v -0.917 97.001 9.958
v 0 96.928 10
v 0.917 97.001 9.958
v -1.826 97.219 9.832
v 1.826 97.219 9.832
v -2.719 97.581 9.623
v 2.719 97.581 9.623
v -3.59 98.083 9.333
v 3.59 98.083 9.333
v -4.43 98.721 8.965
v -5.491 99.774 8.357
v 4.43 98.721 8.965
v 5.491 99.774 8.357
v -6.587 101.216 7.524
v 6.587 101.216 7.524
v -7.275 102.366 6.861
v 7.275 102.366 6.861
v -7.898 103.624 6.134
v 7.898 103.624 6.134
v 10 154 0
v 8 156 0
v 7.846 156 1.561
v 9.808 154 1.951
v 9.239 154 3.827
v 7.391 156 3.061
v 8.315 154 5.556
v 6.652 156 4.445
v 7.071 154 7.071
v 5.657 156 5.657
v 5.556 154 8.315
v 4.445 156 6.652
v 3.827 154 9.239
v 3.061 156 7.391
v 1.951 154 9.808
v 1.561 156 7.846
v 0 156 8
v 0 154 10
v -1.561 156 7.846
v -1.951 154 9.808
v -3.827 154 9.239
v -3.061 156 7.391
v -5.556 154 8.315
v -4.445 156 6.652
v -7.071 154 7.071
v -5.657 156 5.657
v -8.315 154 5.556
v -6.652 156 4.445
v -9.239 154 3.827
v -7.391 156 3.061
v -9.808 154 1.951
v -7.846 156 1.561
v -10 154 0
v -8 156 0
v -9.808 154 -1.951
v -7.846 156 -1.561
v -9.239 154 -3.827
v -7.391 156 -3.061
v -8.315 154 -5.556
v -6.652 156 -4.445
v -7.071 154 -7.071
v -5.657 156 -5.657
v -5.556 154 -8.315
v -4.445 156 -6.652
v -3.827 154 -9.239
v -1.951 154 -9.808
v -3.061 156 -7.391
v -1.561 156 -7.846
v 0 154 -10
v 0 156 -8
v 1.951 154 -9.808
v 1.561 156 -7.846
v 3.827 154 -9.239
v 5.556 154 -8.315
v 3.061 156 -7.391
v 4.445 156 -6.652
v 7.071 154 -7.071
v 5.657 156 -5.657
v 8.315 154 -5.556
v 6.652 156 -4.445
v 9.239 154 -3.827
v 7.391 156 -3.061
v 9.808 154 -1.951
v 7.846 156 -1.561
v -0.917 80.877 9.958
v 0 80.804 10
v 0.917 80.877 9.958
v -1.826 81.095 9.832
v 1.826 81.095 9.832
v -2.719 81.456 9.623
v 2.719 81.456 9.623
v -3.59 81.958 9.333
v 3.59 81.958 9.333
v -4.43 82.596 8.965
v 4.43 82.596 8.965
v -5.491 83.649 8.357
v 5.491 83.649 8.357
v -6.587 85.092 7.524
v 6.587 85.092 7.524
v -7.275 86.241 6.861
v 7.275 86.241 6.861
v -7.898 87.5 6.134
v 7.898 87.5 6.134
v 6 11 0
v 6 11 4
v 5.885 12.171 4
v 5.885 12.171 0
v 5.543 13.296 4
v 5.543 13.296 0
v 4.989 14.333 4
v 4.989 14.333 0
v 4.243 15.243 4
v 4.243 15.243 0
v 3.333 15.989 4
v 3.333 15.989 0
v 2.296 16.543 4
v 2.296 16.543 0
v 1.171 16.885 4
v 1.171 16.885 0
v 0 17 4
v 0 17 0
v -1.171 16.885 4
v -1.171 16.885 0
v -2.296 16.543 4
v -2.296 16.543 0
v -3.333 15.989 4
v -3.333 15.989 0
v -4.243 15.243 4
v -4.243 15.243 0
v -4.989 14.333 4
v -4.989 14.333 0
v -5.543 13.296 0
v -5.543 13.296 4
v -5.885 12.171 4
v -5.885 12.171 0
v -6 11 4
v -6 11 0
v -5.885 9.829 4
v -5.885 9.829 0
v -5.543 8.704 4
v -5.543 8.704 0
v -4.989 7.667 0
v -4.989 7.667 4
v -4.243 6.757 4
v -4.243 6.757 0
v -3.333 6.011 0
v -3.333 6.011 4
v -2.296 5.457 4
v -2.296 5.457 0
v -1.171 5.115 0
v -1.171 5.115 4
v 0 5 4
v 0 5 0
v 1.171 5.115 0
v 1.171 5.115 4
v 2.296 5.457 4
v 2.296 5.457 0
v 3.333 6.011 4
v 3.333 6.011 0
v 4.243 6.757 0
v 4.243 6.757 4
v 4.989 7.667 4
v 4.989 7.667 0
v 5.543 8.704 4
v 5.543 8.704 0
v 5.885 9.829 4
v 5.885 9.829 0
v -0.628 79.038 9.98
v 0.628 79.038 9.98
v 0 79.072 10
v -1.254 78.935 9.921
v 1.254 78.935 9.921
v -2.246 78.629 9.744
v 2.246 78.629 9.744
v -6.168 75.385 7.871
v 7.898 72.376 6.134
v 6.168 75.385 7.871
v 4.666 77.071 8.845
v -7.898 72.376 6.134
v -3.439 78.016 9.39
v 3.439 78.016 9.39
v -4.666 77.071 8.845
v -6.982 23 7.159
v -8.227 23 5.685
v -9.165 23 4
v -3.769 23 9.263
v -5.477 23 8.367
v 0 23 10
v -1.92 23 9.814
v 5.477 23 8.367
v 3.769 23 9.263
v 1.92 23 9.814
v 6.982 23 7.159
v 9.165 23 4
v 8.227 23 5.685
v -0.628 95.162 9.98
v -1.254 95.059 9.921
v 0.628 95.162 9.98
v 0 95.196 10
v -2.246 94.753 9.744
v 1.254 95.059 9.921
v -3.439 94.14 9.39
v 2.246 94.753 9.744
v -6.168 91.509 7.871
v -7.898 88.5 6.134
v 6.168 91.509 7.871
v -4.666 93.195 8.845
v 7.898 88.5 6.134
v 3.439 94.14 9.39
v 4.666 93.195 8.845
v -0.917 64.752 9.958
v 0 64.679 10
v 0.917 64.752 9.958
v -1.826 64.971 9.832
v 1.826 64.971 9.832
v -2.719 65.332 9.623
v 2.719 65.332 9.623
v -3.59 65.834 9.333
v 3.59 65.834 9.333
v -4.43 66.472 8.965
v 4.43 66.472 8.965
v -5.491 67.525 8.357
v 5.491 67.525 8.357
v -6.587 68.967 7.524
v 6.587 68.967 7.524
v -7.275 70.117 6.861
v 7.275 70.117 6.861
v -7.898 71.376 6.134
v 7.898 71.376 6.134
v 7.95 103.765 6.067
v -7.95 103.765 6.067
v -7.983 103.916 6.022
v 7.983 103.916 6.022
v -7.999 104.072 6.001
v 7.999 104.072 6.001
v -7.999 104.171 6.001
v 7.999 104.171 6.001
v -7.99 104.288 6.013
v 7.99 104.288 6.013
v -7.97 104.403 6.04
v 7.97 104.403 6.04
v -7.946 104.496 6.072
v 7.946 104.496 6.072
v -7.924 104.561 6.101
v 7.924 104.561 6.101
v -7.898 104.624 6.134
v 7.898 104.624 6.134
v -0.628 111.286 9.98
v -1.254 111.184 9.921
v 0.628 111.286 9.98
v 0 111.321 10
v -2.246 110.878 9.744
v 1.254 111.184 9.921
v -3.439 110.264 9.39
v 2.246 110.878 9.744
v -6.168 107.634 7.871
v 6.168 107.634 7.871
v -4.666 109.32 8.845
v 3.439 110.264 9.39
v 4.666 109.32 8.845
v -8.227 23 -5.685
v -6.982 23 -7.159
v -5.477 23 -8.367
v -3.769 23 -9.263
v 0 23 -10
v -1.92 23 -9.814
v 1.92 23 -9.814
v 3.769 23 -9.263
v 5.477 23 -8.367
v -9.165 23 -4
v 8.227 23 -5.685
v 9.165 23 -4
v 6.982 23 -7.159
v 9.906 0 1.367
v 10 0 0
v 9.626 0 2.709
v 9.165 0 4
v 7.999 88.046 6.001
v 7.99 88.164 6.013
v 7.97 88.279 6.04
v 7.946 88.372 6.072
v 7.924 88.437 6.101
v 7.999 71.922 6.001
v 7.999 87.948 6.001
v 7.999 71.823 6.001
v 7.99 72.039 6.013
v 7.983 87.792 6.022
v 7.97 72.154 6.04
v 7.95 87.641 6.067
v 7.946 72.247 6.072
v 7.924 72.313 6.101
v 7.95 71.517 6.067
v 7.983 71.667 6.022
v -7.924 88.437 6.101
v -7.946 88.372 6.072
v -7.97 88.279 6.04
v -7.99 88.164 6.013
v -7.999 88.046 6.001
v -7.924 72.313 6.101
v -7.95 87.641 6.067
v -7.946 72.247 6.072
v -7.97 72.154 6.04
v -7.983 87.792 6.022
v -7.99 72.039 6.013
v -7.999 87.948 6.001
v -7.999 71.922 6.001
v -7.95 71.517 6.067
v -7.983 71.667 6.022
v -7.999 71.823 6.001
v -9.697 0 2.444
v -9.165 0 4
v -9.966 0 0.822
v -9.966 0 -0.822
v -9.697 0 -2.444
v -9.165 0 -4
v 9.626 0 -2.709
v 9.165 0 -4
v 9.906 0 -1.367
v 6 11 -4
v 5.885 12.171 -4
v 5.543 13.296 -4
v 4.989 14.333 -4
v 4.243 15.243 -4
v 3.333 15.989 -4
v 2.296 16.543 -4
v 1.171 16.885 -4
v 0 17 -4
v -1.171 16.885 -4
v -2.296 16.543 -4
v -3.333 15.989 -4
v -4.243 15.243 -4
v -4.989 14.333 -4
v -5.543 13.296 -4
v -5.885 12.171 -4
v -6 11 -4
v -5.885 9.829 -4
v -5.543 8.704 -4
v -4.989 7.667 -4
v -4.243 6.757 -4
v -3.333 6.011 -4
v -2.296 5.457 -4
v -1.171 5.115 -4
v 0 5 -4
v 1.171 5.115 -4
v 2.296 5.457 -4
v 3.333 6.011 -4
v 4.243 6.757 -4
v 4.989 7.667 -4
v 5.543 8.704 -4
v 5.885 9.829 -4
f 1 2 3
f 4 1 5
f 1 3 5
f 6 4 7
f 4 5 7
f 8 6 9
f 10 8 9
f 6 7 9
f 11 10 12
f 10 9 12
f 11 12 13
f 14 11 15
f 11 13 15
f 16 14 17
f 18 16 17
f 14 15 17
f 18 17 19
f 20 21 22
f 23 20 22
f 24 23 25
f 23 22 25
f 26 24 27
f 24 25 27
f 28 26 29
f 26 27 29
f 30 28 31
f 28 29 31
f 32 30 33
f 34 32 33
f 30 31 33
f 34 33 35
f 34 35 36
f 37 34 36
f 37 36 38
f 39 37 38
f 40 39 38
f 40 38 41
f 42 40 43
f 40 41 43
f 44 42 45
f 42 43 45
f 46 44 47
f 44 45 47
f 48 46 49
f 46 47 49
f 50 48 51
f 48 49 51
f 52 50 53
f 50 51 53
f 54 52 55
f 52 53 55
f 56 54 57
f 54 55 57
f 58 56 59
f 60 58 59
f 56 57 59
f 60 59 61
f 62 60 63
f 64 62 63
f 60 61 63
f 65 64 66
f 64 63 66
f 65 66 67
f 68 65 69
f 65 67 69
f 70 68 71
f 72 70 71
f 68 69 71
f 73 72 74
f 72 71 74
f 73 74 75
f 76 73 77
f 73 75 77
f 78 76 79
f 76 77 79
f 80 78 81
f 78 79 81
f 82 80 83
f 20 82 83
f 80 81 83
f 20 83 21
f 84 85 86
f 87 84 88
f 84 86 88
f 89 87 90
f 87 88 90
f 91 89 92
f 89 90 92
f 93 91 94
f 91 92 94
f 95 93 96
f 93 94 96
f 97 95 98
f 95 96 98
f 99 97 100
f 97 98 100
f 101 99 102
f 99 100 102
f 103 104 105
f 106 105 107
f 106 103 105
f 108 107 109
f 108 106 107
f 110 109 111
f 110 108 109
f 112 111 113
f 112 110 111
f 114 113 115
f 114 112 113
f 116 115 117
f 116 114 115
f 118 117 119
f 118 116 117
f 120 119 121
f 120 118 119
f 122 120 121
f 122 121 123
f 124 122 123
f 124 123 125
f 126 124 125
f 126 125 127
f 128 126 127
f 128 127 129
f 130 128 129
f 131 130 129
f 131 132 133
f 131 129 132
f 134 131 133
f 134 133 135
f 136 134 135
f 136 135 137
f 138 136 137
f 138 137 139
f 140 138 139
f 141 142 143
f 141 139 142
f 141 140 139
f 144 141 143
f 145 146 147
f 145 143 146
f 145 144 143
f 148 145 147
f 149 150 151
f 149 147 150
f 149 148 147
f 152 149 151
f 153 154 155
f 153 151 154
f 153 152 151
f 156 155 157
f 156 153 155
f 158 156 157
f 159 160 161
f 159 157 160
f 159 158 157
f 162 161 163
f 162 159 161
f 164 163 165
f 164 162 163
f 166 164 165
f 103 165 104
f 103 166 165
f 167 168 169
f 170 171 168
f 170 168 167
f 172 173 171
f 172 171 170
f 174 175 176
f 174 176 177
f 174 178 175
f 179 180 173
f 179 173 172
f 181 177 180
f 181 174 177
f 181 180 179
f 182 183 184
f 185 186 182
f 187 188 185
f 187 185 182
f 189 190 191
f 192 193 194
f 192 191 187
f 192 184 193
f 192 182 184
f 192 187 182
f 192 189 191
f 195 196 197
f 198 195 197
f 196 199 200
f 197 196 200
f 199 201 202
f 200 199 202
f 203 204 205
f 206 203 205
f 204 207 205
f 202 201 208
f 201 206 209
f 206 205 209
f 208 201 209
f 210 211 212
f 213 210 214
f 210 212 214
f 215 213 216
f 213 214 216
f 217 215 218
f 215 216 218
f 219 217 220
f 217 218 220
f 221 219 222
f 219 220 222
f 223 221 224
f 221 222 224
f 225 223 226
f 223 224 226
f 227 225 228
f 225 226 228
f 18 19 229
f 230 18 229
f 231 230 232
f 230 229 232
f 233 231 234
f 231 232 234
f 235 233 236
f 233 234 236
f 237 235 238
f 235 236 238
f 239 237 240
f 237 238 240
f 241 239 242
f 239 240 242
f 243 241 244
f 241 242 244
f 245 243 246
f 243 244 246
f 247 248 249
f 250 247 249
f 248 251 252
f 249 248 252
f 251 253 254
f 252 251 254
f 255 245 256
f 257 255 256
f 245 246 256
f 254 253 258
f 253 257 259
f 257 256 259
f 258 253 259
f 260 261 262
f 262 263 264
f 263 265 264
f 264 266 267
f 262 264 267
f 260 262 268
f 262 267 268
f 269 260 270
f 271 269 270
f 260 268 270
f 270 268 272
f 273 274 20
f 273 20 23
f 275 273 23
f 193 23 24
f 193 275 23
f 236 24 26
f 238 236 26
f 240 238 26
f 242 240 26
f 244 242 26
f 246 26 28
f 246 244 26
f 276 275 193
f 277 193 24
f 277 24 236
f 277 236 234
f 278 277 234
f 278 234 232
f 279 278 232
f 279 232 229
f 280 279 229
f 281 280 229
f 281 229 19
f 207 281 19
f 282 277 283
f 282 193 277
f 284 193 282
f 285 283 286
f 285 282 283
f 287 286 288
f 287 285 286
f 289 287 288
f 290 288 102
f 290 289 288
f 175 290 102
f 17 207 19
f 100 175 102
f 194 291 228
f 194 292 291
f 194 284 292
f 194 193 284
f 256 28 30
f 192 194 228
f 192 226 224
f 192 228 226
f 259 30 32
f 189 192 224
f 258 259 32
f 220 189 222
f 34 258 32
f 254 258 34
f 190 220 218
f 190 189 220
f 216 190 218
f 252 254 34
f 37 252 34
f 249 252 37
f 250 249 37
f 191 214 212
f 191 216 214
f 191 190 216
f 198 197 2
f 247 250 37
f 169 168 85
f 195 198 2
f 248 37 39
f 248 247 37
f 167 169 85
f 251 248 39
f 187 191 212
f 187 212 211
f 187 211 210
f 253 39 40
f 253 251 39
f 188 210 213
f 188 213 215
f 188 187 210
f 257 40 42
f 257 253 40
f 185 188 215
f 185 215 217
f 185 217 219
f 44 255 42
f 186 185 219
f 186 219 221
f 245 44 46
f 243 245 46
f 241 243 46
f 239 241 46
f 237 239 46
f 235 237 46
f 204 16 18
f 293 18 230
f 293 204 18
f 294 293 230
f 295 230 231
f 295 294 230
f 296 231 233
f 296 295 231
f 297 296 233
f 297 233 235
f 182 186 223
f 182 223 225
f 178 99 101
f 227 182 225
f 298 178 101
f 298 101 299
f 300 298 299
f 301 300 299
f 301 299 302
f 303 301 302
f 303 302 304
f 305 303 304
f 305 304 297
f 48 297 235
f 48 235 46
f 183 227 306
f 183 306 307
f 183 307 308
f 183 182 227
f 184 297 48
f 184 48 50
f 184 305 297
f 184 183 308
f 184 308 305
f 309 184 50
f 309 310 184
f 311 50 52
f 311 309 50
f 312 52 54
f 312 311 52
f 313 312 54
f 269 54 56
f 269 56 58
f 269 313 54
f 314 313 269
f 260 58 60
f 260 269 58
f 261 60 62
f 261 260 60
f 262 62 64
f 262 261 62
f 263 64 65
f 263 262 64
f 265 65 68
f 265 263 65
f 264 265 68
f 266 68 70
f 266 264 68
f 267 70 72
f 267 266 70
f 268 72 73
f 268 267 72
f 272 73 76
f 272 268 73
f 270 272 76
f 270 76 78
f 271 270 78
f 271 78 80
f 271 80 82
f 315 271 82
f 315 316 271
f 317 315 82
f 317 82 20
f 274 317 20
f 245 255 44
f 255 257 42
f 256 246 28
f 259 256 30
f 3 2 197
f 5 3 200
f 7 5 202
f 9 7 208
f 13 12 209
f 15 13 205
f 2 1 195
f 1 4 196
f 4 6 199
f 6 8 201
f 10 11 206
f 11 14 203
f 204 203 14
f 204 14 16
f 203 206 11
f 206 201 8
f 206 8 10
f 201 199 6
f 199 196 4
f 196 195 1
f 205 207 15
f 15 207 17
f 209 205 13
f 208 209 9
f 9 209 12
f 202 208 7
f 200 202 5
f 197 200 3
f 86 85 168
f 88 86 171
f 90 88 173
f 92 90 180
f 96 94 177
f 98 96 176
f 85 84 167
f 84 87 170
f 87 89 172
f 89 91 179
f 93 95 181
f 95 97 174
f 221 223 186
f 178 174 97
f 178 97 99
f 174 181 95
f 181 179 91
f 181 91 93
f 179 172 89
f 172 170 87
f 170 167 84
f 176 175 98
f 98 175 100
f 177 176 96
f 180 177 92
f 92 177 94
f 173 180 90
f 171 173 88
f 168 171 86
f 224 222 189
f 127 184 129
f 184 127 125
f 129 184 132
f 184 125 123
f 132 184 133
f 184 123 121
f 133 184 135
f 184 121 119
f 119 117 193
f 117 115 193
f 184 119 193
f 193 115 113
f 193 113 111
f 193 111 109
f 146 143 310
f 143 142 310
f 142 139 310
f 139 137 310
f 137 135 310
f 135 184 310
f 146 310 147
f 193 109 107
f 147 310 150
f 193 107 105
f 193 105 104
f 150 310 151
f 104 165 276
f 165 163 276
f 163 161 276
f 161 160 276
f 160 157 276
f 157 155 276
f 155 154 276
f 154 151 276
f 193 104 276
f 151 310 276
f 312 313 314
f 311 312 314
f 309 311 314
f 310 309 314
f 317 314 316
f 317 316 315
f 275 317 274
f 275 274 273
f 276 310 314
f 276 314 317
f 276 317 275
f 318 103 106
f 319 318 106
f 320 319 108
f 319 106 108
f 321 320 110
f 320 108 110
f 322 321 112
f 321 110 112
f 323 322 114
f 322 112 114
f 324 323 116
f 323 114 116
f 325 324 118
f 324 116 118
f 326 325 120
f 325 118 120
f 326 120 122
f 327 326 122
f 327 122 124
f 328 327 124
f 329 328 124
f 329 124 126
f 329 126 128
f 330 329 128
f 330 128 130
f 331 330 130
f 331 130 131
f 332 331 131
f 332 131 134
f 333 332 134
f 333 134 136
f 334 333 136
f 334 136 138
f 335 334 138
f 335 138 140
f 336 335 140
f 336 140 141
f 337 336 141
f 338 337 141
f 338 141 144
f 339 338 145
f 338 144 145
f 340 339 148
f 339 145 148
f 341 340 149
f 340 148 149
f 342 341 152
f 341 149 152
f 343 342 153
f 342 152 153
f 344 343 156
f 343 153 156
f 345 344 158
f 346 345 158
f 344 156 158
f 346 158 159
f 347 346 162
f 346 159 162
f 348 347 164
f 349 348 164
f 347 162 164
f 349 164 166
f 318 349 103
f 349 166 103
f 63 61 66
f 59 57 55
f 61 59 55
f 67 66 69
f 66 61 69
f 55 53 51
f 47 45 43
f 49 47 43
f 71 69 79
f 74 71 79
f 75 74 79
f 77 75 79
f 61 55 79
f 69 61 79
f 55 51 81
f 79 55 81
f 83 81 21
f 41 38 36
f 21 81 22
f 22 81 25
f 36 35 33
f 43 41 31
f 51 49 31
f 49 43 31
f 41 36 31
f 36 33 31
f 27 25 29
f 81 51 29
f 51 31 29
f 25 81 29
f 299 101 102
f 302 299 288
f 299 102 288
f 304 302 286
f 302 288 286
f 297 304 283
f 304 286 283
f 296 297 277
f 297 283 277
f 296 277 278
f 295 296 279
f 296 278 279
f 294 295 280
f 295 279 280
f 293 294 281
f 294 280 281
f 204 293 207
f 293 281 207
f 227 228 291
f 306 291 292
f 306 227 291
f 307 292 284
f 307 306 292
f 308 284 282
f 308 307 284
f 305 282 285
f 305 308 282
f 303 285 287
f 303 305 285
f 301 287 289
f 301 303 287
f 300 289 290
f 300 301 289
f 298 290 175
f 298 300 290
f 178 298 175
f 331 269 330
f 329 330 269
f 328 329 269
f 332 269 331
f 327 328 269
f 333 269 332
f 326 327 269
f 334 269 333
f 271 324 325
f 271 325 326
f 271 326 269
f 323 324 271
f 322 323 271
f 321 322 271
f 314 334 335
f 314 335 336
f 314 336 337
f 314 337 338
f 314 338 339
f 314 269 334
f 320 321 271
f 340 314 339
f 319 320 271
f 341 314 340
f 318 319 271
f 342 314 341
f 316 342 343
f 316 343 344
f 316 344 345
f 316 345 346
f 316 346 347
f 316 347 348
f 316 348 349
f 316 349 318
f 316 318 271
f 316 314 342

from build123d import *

# Parameters (mm, degrees)
F0_R          = 10
F1_DEPTH      = 156
F2_SIZE       = 2
F3_W          = 20
F3_H          = 8
F4_DEPTH      = 23
F5_R          = 6
F6_DEPTH      = 10.001
F6_DEPTH_BACK = 10.001
F8_DEPTH      = 10.001
F8_DEPTH_BACK = 10.001


# Not quite as in the source:
# - a pattern or mirror of a feature is missing from the dataset's text; its kind, count and spacing are read off the source's solid


with BuildPart() as f1:
    # F0 (on Front) → F1 (new body)
    with BuildSketch(Plane.XZ):
        Circle(F0_R)
    extrude(amount=-F1_DEPTH)

    # F2
    f2_edges = [f1.edges().sort_by_distance(p)[0] for p in [
        (-10, 156, 0),
    ]]
    chamfer(f2_edges, length=F2_SIZE)

    # F3 (on Front) → F4 (cut)
    with BuildSketch(Plane.XZ):
        with Locations((0, 8)):
            Rectangle(F3_W, F3_H)
    f4 = extrude(amount=-F4_DEPTH, mode=Mode.SUBTRACT)

    # F4_copies: F4 across plane
    add(f4.mirror(Plane(origin=(0, 0, 0), x_dir=(-1, 0, 0), z_dir=(0, 0, -1))), mode=Mode.SUBTRACT)

    # F5 (on Top) → F6 (cut, two sides)
    with BuildSketch(Plane.XY) as f6_sk:
        with Locations((0, 11)):
            Circle(F5_R)
    extrude(amount=-F6_DEPTH, mode=Mode.SUBTRACT)
    extrude(f6_sk.sketch, amount=F6_DEPTH_BACK, mode=Mode.SUBTRACT)

    # F7 (on Right) → F8 (cut, two sides)
    with BuildSketch(Plane.YZ) as f8_sk:
        with BuildLine():
            Line((96.0621778265, 10.5), (79.9378221735, 10.5))
            Line((79.9378221735, 10.5), (87.5, 6.1339745962))
            ThreePointArc((87.5, 6.1339745962), (88, 6), (88.5, 6.1339745962))
            Line((88.5, 6.1339745962), (96.0621778265, 10.5))
        make_face()
        with BuildLine():
            Line((112.1865334795, 10.5), (96.0621778265, 10.5))
            Line((96.0621778265, 10.5), (103.624355653, 6.1339745962))
            ThreePointArc((103.624355653, 6.1339745962), (104.124355653, 6), (104.624355653, 6.1339745962))
            Line((104.624355653, 6.1339745962), (112.1865334795, 10.5))
        make_face()
        with BuildLine():
            Line((72.375644347, 6.1339745962), (79.9378221735, 10.5))
            Line((79.9378221735, 10.5), (63.8134665205, 10.5))
            Line((63.8134665205, 10.5), (71.375644347, 6.1339745962))
            ThreePointArc((71.375644347, 6.1339745962), (71.875644347, 6), (72.375644347, 6.1339745962))
        make_face()
    extrude(amount=-F8_DEPTH, mode=Mode.SUBTRACT)
    extrude(f8_sk.sketch, amount=F8_DEPTH_BACK, mode=Mode.SUBTRACT)


solid = f1.part
